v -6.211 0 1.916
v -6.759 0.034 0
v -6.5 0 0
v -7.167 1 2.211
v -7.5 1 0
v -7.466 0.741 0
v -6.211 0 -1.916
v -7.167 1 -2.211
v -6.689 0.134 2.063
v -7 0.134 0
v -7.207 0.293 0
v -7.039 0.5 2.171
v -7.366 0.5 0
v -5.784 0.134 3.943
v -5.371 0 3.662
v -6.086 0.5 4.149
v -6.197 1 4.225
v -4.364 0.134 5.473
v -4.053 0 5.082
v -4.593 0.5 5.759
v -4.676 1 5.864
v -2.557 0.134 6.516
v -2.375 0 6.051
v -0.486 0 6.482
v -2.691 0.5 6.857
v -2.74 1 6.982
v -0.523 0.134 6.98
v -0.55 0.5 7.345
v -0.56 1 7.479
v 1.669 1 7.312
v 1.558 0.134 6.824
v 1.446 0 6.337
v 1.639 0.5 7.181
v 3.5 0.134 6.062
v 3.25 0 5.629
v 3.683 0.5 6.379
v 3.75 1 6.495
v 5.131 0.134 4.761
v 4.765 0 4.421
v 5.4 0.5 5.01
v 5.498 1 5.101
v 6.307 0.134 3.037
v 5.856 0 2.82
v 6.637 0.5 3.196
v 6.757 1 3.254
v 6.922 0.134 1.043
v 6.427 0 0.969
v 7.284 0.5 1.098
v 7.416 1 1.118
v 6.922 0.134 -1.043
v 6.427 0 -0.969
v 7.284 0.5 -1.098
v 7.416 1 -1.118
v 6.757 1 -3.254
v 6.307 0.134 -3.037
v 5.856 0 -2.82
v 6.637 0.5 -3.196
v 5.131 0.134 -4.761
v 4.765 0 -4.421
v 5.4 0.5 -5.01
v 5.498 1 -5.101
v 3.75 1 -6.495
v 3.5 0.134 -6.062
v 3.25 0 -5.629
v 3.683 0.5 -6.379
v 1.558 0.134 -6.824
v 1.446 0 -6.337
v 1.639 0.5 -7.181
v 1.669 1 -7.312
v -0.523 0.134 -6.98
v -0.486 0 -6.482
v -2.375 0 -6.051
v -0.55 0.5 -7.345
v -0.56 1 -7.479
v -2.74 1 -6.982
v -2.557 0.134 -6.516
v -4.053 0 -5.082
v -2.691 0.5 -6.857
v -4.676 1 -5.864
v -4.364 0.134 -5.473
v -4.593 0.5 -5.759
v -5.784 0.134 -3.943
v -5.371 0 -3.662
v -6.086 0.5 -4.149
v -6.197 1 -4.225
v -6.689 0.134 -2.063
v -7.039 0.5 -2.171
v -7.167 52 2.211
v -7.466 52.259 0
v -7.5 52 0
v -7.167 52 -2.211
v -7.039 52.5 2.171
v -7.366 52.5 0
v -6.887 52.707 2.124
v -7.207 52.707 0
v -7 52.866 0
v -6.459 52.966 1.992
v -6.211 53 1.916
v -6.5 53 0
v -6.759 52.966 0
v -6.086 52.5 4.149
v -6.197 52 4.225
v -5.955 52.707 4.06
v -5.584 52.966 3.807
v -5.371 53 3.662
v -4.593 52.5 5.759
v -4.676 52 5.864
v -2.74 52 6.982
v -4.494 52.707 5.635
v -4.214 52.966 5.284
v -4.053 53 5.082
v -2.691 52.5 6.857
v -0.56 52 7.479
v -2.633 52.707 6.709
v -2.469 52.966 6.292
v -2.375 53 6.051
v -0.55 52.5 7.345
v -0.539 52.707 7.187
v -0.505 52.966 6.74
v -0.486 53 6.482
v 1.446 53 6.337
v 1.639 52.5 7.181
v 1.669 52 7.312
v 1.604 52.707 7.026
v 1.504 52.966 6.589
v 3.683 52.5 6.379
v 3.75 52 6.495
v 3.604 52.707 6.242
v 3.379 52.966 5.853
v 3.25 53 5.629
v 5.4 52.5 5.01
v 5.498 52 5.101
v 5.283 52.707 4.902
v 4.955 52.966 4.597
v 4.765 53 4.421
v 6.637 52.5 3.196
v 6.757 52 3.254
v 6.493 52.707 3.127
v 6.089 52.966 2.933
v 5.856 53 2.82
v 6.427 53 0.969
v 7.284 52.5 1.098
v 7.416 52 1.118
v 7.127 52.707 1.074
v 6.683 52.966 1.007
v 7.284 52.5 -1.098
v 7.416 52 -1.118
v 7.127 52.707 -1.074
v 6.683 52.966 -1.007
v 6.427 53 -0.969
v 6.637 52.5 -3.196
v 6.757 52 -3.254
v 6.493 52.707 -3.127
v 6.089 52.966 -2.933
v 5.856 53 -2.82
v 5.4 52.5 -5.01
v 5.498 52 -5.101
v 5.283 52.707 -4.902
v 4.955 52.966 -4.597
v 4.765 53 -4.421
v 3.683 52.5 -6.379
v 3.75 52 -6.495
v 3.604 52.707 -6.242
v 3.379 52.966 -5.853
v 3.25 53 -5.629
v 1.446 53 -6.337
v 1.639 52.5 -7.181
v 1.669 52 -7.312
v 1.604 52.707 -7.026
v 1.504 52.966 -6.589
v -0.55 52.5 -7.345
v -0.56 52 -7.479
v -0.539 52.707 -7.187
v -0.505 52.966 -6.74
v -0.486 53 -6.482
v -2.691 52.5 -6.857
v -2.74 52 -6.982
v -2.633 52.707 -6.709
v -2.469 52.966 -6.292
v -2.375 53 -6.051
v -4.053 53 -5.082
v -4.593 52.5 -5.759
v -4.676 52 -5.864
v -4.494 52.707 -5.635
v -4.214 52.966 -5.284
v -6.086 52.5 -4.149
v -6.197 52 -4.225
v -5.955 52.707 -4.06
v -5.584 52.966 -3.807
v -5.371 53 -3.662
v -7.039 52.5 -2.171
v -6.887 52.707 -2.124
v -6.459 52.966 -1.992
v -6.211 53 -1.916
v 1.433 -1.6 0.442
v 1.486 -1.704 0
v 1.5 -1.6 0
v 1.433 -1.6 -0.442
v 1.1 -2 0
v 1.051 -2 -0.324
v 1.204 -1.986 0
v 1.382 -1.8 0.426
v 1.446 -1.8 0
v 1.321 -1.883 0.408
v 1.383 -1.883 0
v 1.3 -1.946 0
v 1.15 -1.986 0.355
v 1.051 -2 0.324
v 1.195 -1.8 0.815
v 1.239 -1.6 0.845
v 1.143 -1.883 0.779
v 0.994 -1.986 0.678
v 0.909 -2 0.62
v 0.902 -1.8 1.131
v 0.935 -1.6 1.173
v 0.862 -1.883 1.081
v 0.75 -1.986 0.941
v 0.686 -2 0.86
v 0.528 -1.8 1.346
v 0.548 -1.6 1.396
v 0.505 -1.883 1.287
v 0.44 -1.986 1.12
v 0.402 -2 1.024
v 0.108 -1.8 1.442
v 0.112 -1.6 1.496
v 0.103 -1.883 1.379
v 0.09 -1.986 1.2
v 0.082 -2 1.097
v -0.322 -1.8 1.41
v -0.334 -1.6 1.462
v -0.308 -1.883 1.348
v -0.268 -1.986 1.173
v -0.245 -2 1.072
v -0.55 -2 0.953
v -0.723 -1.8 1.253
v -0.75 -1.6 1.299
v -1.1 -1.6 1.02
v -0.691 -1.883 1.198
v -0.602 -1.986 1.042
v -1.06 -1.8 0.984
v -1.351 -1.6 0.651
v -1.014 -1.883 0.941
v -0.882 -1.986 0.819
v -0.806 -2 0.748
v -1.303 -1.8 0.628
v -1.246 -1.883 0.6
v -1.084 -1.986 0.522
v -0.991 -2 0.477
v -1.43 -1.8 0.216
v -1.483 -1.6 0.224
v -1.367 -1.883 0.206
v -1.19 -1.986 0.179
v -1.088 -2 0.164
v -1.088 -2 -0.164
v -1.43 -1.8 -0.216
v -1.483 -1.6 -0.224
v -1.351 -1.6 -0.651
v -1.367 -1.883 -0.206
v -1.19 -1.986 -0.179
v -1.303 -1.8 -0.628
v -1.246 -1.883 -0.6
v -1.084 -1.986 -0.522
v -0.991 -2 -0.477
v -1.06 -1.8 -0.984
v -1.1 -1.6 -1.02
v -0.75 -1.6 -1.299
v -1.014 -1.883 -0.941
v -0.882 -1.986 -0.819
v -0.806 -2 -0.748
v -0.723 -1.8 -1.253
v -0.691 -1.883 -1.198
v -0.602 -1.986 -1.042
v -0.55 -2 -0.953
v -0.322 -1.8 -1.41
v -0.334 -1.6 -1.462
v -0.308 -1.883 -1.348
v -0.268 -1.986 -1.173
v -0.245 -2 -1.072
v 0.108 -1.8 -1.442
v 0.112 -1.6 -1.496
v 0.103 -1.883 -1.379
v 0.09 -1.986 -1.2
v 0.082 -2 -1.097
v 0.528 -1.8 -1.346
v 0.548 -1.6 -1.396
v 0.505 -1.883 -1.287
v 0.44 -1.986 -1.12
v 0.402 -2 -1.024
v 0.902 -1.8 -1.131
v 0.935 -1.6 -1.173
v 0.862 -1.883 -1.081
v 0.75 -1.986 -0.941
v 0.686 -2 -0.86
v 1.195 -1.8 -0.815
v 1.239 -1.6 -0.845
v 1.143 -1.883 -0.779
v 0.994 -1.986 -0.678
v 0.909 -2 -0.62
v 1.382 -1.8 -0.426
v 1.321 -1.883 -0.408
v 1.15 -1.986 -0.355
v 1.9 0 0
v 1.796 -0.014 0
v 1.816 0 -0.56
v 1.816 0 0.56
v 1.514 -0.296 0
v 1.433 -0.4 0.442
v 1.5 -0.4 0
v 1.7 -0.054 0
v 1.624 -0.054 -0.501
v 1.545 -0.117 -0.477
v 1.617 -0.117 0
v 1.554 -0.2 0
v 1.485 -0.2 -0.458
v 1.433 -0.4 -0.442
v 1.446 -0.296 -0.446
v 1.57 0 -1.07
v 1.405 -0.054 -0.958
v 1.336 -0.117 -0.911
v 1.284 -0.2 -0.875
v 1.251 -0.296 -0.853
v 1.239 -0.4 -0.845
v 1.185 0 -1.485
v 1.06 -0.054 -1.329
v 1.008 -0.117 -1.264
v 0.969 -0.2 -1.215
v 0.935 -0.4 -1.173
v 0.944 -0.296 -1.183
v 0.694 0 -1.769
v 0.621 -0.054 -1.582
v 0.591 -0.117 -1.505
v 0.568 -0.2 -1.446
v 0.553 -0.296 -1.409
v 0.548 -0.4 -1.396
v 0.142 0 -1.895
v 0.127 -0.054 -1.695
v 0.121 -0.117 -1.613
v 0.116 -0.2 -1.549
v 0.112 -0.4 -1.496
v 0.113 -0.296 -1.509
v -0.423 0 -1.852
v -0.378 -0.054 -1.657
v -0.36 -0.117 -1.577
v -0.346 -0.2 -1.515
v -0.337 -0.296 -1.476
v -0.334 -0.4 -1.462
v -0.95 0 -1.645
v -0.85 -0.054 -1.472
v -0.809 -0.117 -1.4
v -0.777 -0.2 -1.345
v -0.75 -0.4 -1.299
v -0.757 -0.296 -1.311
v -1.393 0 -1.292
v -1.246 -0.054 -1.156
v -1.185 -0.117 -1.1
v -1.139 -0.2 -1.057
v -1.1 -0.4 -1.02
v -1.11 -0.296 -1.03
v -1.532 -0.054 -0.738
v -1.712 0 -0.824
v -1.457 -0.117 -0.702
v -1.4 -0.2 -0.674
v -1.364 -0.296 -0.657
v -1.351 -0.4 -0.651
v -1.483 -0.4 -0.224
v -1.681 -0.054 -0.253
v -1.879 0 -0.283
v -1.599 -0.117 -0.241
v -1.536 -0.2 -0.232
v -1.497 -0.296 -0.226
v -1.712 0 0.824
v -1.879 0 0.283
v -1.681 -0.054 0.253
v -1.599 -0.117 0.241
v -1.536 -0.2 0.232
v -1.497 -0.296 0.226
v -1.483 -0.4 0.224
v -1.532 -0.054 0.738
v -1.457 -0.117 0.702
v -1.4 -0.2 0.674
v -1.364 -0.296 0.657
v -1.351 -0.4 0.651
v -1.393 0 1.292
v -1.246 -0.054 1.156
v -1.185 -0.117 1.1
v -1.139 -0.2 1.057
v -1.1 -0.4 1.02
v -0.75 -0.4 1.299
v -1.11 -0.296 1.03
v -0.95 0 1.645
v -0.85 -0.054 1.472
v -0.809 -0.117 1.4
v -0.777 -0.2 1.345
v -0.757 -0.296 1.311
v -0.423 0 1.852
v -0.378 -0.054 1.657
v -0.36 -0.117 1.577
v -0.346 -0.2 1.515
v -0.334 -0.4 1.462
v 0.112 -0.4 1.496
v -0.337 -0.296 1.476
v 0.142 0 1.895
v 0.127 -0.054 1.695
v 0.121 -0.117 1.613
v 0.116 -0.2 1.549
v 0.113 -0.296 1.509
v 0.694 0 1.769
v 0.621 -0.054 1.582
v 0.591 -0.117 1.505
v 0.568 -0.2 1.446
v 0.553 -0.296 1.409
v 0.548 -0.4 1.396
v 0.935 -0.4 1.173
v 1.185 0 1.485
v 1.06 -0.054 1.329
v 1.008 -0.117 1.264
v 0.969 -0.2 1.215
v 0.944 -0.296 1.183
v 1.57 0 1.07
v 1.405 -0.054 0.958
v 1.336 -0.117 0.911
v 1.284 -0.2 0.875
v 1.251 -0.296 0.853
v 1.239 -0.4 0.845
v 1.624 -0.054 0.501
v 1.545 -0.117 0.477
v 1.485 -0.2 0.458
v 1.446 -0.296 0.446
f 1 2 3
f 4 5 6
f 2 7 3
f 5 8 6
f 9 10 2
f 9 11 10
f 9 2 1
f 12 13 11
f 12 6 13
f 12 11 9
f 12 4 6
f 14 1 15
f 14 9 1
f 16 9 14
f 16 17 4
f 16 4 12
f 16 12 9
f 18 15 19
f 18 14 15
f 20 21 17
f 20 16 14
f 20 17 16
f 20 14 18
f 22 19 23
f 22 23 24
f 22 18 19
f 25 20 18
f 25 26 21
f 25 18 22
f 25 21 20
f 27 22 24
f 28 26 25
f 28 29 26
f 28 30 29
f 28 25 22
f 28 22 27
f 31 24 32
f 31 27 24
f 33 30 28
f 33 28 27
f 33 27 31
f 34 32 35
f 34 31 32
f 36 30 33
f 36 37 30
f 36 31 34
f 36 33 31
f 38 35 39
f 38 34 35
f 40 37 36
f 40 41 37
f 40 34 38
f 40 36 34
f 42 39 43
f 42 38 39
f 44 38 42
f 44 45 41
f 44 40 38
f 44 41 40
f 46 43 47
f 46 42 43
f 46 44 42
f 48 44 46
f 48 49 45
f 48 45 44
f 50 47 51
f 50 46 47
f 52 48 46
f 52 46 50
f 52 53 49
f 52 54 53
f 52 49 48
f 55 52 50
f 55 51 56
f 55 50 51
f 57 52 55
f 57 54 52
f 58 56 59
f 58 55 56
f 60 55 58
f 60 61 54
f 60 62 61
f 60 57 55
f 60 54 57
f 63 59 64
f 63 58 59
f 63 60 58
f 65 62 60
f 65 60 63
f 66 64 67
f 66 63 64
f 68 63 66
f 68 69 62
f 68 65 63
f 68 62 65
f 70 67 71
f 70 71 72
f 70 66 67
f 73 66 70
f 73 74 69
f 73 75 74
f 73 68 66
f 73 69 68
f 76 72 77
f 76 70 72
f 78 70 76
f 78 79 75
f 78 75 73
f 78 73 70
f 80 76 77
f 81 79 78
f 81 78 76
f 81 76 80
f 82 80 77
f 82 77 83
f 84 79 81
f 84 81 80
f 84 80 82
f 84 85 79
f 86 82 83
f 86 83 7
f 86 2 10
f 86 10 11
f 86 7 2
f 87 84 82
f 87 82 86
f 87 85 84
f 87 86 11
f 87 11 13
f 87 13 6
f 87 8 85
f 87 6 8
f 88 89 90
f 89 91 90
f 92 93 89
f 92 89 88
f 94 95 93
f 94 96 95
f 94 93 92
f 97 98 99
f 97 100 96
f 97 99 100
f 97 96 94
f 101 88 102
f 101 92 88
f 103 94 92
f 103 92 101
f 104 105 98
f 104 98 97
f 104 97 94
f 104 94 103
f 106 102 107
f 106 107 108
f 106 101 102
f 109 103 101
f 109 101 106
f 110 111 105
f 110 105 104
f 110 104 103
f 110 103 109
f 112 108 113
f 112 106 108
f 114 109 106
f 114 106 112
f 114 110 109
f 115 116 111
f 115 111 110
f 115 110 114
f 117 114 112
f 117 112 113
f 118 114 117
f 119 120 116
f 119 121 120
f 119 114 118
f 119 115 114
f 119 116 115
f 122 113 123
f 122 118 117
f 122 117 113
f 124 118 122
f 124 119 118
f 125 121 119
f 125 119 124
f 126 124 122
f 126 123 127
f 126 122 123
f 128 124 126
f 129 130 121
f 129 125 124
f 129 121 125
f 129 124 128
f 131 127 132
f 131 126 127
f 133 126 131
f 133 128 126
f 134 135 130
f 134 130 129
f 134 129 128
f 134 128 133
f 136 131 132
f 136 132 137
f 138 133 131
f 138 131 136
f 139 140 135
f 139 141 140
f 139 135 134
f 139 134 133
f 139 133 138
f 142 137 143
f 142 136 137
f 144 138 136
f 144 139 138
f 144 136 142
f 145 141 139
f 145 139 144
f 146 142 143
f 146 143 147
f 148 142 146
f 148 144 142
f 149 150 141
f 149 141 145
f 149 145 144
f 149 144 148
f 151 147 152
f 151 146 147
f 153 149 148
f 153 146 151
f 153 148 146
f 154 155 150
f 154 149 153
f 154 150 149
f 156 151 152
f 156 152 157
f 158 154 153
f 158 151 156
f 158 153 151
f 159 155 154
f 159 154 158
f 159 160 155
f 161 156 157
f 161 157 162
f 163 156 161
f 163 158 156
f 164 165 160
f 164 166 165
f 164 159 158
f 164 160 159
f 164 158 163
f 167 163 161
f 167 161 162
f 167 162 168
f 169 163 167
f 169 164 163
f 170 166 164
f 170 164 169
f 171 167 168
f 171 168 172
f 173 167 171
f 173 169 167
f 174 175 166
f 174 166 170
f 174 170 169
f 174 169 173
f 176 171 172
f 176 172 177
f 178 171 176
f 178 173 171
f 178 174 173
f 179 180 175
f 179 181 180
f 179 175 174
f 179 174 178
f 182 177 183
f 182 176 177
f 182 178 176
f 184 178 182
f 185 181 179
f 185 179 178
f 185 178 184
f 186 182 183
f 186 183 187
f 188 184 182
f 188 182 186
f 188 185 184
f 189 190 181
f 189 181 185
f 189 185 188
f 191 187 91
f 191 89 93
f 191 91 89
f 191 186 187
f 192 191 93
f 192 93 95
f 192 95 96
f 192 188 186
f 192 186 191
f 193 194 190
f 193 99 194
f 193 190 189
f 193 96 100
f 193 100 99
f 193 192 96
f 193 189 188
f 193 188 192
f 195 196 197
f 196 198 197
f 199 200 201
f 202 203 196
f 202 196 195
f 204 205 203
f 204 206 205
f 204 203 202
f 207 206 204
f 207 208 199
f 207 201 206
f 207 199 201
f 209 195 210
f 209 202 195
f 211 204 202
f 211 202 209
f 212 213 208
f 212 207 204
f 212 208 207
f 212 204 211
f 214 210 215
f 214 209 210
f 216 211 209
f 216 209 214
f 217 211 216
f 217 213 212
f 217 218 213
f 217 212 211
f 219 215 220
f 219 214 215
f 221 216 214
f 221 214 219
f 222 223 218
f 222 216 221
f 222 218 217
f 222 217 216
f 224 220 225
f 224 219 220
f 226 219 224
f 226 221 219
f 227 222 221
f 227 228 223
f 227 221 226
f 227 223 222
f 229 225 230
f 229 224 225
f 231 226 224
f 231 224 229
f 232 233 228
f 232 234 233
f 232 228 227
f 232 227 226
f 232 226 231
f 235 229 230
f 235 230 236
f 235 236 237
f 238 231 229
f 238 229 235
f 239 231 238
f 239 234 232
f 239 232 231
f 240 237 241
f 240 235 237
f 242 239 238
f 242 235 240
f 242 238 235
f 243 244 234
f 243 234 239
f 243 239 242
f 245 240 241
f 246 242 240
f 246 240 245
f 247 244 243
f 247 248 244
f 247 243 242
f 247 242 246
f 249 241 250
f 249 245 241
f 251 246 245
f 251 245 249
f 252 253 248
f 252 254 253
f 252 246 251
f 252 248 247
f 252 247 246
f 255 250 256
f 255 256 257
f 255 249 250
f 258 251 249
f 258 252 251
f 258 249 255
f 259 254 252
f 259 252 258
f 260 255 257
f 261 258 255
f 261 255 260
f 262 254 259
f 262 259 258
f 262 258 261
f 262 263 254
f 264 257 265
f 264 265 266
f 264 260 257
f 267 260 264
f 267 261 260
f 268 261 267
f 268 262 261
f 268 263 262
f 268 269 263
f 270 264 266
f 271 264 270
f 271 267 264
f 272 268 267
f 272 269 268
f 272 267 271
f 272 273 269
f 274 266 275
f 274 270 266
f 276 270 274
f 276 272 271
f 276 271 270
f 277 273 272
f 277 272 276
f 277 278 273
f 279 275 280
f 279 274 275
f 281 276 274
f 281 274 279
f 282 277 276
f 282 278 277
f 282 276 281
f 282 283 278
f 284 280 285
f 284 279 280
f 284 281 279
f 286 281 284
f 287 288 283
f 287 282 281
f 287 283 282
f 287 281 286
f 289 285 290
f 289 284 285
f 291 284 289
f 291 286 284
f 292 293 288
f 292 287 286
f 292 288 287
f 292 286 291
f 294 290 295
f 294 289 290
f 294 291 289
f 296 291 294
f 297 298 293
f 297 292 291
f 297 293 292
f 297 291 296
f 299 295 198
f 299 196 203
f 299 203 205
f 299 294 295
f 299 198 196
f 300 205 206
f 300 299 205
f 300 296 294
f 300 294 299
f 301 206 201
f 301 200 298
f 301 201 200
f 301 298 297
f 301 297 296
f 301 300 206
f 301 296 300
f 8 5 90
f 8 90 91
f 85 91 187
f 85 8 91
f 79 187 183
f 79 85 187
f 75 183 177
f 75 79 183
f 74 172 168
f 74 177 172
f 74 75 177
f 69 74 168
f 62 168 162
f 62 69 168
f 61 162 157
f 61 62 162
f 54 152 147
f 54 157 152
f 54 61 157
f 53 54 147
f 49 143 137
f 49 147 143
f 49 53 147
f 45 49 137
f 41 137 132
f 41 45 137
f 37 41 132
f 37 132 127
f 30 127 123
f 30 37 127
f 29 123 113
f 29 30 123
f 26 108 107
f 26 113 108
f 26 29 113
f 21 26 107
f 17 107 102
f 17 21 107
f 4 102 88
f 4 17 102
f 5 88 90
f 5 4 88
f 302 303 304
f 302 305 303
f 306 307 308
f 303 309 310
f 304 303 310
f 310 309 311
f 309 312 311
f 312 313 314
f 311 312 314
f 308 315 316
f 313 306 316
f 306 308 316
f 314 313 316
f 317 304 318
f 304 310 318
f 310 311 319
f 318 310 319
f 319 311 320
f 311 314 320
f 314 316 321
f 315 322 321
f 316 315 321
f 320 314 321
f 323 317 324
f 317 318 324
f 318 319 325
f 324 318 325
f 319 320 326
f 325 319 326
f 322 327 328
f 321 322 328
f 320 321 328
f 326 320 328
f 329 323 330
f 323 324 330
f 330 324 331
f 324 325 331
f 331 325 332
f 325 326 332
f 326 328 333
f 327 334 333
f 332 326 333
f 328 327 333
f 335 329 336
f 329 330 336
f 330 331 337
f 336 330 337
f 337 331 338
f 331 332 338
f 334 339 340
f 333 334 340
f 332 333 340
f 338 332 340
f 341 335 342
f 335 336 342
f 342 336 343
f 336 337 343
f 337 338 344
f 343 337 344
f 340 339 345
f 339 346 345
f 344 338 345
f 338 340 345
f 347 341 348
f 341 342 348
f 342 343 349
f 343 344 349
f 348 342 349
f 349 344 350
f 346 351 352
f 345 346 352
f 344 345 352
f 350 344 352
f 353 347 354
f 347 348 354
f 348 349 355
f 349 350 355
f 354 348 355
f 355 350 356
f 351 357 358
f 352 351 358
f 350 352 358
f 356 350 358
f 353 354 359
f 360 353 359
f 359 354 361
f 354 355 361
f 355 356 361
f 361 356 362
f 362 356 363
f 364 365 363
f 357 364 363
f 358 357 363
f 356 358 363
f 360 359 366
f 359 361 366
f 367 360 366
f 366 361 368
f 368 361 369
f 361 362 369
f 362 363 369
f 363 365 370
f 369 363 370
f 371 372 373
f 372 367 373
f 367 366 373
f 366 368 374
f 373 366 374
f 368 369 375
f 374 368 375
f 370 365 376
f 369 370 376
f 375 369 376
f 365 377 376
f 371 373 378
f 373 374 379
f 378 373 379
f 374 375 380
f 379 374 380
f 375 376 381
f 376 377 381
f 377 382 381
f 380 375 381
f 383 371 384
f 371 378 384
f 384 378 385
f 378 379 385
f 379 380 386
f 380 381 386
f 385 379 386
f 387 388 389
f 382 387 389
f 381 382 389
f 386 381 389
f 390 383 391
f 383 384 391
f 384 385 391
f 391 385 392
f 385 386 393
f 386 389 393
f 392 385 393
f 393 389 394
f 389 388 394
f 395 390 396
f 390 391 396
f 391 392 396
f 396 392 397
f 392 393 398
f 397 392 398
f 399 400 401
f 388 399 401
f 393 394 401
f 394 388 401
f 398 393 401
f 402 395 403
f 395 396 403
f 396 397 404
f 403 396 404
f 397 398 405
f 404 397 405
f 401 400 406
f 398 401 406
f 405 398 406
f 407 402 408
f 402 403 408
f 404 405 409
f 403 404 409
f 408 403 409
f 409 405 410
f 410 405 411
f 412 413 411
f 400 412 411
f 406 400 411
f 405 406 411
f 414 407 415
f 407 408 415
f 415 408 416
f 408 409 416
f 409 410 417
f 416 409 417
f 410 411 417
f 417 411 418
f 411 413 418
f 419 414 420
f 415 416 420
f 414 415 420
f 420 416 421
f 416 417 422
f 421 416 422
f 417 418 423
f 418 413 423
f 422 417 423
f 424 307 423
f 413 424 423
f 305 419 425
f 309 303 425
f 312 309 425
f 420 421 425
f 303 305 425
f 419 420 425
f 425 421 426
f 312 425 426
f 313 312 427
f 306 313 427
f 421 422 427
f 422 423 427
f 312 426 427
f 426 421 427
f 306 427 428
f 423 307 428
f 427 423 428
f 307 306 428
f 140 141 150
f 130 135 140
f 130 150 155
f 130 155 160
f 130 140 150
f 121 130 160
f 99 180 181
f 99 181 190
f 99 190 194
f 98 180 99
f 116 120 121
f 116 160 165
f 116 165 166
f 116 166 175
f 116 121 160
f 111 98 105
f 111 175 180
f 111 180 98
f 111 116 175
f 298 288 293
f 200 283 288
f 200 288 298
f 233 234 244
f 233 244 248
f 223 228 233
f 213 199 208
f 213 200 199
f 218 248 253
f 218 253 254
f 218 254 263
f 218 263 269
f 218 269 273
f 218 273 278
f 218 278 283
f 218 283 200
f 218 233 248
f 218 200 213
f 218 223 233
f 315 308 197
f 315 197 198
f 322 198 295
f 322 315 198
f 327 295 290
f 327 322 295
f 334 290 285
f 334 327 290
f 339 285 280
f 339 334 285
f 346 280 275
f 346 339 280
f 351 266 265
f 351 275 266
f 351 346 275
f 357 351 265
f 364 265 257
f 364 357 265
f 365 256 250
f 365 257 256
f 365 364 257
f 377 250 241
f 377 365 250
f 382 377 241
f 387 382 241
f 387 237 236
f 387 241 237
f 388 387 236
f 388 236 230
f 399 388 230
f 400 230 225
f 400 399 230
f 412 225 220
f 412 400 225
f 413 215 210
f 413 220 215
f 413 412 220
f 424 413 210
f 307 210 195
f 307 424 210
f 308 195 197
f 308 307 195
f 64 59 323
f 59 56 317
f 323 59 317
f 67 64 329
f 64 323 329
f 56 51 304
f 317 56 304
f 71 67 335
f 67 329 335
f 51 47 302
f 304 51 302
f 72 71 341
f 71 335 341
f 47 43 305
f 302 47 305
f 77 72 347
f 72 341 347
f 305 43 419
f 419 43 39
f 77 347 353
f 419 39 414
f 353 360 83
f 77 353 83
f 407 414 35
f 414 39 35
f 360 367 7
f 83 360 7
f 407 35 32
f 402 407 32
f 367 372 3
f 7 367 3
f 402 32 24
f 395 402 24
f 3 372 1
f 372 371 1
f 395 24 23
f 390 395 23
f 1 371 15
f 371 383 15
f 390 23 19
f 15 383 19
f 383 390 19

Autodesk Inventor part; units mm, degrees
ref_plane "YZ Plane" through (0, 0, 0) normal (1, 0, 0) x (0, 1, 0)
ref_plane "XZ Plane" through (0, 0, 0) normal (0, 1, 0) x (-1, 0, 0)
ref_plane "XY Plane" through (0, 0, 0) normal (0, 0, 1) x (1, 0, 0)
sketch "Sketch1" plane through (0, 0, 0) normal (0, 1, 0) x (-1, 0, 0)
  circle A0 centre (0, 0) radius 7.5
  dimension "d8" = 15
extrude "Extrusion1" add sketch "Sketch1" along normal blind 53
sketch "Sketch2" plane through (0, 0, 0) normal (0, -1, 0) x (1, 0, 0)
  circle A0 centre (0, 0) radius 1.5
  dimension "d3" = 3
extrude "Extrusion2" add sketch "Sketch2" along normal blind 2
fillet "Fillet1" [suppressed]
fillet "Fillet2" radius 0.4 2 edges at (-1.5, -2, 0) (-1.5, 0, 0)
fillet "Fillet3" radius 1 2 edges at (7.5, 53, 0) (7.5, 0, 0)
properties part number "Battery"
